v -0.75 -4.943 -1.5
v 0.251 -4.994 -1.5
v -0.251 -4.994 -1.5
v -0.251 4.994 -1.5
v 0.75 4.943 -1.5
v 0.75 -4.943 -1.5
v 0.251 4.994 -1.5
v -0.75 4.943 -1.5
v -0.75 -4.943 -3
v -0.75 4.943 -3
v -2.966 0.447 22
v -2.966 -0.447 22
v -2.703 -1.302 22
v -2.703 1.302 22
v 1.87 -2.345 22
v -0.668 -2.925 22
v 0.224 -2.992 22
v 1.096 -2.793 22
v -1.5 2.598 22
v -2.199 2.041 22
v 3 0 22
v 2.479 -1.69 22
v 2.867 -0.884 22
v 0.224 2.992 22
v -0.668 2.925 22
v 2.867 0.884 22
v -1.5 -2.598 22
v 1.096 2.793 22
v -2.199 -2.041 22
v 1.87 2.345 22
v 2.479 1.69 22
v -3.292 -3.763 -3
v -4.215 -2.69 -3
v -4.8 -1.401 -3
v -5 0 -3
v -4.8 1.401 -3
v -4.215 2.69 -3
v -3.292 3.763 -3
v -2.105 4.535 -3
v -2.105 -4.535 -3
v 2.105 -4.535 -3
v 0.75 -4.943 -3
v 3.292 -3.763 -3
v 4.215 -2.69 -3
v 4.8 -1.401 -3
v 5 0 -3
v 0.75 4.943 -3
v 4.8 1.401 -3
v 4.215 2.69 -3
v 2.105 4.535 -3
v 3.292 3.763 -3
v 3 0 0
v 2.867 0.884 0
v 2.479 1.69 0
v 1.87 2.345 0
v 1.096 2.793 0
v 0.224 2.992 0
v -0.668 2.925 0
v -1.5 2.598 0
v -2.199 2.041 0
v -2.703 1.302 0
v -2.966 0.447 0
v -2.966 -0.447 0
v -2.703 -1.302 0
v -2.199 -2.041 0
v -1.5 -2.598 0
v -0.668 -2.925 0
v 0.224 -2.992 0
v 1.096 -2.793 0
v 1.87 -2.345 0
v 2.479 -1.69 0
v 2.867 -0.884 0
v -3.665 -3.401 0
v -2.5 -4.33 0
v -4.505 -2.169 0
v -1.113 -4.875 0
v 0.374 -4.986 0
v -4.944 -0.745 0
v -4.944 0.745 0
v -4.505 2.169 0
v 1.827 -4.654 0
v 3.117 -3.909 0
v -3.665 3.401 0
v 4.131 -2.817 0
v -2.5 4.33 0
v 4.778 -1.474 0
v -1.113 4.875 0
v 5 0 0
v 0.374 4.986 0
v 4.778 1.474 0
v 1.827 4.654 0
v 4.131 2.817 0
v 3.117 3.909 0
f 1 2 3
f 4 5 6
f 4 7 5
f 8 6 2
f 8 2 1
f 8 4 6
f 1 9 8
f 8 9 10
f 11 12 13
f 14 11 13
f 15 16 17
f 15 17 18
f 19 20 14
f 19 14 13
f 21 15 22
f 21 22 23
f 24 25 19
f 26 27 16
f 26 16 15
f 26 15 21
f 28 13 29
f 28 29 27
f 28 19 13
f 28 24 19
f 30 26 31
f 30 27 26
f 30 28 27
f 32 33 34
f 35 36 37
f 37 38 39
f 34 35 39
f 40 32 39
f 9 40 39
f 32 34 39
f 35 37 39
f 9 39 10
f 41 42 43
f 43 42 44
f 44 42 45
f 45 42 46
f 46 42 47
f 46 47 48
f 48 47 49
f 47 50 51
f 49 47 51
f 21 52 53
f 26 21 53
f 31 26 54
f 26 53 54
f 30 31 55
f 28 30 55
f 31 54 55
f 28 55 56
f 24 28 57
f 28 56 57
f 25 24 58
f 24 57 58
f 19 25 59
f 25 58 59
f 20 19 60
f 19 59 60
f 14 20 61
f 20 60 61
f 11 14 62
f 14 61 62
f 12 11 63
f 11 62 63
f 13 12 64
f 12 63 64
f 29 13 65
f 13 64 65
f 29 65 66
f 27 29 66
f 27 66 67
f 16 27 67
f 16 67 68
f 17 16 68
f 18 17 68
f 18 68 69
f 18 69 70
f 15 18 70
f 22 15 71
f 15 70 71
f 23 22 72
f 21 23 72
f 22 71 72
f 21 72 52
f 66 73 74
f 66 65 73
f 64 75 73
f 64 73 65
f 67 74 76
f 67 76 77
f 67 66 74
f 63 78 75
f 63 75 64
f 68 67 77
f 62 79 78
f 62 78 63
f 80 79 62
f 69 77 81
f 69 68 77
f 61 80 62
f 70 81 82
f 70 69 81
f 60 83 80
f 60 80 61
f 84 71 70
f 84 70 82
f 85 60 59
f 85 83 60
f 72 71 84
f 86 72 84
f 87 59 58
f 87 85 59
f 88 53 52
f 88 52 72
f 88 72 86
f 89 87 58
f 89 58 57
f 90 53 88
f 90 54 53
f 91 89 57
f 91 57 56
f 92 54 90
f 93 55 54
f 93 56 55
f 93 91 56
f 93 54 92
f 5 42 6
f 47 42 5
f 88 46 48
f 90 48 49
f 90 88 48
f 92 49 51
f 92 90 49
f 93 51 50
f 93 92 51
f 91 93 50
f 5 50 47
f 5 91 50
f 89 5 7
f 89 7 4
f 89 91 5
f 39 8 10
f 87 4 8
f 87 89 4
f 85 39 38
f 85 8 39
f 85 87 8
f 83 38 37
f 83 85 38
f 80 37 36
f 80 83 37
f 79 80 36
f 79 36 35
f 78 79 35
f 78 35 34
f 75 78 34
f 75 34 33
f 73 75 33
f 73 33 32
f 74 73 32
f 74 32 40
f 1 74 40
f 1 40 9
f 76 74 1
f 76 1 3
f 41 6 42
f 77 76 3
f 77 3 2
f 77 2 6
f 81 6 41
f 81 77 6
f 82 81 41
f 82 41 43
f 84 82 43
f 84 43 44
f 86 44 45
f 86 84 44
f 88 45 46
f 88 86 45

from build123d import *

# Parameters (mm, degrees)
SKETCH_1_R          = 3
EXTRUDE_1_DEPTH     = 22
SKETCH_1_3_R        = 5
EXTRUDE_2_DEPTH     = 3
SKETCH_2_W          = 1.5
SKETCH_2_H          = 10
CUT_EXTRUDE_1_DEPTH = 1.5


with BuildPart() as part:
    # 草图1 → 凸台-拉伸1 (new body)
    with BuildSketch(Plane.XY):
        Circle(SKETCH_1_R)
    extrude(amount=EXTRUDE_1_DEPTH)

    # 草图1<3> → 凸台-拉伸2 (add)
    with BuildSketch(Plane.XY):
        Circle(SKETCH_1_3_R)
    extrude(amount=-EXTRUDE_2_DEPTH)

    # 草图2 → 切除-拉伸1 (cut)
    with BuildSketch(Plane(origin=(0, 0, -3), x_dir=(-1, 0, 0), z_dir=(0, 0, -1))):
        Rectangle(SKETCH_2_W, SKETCH_2_H)
    extrude(amount=-CUT_EXTRUDE_1_DEPTH, mode=Mode.SUBTRACT)


solid = part.part
